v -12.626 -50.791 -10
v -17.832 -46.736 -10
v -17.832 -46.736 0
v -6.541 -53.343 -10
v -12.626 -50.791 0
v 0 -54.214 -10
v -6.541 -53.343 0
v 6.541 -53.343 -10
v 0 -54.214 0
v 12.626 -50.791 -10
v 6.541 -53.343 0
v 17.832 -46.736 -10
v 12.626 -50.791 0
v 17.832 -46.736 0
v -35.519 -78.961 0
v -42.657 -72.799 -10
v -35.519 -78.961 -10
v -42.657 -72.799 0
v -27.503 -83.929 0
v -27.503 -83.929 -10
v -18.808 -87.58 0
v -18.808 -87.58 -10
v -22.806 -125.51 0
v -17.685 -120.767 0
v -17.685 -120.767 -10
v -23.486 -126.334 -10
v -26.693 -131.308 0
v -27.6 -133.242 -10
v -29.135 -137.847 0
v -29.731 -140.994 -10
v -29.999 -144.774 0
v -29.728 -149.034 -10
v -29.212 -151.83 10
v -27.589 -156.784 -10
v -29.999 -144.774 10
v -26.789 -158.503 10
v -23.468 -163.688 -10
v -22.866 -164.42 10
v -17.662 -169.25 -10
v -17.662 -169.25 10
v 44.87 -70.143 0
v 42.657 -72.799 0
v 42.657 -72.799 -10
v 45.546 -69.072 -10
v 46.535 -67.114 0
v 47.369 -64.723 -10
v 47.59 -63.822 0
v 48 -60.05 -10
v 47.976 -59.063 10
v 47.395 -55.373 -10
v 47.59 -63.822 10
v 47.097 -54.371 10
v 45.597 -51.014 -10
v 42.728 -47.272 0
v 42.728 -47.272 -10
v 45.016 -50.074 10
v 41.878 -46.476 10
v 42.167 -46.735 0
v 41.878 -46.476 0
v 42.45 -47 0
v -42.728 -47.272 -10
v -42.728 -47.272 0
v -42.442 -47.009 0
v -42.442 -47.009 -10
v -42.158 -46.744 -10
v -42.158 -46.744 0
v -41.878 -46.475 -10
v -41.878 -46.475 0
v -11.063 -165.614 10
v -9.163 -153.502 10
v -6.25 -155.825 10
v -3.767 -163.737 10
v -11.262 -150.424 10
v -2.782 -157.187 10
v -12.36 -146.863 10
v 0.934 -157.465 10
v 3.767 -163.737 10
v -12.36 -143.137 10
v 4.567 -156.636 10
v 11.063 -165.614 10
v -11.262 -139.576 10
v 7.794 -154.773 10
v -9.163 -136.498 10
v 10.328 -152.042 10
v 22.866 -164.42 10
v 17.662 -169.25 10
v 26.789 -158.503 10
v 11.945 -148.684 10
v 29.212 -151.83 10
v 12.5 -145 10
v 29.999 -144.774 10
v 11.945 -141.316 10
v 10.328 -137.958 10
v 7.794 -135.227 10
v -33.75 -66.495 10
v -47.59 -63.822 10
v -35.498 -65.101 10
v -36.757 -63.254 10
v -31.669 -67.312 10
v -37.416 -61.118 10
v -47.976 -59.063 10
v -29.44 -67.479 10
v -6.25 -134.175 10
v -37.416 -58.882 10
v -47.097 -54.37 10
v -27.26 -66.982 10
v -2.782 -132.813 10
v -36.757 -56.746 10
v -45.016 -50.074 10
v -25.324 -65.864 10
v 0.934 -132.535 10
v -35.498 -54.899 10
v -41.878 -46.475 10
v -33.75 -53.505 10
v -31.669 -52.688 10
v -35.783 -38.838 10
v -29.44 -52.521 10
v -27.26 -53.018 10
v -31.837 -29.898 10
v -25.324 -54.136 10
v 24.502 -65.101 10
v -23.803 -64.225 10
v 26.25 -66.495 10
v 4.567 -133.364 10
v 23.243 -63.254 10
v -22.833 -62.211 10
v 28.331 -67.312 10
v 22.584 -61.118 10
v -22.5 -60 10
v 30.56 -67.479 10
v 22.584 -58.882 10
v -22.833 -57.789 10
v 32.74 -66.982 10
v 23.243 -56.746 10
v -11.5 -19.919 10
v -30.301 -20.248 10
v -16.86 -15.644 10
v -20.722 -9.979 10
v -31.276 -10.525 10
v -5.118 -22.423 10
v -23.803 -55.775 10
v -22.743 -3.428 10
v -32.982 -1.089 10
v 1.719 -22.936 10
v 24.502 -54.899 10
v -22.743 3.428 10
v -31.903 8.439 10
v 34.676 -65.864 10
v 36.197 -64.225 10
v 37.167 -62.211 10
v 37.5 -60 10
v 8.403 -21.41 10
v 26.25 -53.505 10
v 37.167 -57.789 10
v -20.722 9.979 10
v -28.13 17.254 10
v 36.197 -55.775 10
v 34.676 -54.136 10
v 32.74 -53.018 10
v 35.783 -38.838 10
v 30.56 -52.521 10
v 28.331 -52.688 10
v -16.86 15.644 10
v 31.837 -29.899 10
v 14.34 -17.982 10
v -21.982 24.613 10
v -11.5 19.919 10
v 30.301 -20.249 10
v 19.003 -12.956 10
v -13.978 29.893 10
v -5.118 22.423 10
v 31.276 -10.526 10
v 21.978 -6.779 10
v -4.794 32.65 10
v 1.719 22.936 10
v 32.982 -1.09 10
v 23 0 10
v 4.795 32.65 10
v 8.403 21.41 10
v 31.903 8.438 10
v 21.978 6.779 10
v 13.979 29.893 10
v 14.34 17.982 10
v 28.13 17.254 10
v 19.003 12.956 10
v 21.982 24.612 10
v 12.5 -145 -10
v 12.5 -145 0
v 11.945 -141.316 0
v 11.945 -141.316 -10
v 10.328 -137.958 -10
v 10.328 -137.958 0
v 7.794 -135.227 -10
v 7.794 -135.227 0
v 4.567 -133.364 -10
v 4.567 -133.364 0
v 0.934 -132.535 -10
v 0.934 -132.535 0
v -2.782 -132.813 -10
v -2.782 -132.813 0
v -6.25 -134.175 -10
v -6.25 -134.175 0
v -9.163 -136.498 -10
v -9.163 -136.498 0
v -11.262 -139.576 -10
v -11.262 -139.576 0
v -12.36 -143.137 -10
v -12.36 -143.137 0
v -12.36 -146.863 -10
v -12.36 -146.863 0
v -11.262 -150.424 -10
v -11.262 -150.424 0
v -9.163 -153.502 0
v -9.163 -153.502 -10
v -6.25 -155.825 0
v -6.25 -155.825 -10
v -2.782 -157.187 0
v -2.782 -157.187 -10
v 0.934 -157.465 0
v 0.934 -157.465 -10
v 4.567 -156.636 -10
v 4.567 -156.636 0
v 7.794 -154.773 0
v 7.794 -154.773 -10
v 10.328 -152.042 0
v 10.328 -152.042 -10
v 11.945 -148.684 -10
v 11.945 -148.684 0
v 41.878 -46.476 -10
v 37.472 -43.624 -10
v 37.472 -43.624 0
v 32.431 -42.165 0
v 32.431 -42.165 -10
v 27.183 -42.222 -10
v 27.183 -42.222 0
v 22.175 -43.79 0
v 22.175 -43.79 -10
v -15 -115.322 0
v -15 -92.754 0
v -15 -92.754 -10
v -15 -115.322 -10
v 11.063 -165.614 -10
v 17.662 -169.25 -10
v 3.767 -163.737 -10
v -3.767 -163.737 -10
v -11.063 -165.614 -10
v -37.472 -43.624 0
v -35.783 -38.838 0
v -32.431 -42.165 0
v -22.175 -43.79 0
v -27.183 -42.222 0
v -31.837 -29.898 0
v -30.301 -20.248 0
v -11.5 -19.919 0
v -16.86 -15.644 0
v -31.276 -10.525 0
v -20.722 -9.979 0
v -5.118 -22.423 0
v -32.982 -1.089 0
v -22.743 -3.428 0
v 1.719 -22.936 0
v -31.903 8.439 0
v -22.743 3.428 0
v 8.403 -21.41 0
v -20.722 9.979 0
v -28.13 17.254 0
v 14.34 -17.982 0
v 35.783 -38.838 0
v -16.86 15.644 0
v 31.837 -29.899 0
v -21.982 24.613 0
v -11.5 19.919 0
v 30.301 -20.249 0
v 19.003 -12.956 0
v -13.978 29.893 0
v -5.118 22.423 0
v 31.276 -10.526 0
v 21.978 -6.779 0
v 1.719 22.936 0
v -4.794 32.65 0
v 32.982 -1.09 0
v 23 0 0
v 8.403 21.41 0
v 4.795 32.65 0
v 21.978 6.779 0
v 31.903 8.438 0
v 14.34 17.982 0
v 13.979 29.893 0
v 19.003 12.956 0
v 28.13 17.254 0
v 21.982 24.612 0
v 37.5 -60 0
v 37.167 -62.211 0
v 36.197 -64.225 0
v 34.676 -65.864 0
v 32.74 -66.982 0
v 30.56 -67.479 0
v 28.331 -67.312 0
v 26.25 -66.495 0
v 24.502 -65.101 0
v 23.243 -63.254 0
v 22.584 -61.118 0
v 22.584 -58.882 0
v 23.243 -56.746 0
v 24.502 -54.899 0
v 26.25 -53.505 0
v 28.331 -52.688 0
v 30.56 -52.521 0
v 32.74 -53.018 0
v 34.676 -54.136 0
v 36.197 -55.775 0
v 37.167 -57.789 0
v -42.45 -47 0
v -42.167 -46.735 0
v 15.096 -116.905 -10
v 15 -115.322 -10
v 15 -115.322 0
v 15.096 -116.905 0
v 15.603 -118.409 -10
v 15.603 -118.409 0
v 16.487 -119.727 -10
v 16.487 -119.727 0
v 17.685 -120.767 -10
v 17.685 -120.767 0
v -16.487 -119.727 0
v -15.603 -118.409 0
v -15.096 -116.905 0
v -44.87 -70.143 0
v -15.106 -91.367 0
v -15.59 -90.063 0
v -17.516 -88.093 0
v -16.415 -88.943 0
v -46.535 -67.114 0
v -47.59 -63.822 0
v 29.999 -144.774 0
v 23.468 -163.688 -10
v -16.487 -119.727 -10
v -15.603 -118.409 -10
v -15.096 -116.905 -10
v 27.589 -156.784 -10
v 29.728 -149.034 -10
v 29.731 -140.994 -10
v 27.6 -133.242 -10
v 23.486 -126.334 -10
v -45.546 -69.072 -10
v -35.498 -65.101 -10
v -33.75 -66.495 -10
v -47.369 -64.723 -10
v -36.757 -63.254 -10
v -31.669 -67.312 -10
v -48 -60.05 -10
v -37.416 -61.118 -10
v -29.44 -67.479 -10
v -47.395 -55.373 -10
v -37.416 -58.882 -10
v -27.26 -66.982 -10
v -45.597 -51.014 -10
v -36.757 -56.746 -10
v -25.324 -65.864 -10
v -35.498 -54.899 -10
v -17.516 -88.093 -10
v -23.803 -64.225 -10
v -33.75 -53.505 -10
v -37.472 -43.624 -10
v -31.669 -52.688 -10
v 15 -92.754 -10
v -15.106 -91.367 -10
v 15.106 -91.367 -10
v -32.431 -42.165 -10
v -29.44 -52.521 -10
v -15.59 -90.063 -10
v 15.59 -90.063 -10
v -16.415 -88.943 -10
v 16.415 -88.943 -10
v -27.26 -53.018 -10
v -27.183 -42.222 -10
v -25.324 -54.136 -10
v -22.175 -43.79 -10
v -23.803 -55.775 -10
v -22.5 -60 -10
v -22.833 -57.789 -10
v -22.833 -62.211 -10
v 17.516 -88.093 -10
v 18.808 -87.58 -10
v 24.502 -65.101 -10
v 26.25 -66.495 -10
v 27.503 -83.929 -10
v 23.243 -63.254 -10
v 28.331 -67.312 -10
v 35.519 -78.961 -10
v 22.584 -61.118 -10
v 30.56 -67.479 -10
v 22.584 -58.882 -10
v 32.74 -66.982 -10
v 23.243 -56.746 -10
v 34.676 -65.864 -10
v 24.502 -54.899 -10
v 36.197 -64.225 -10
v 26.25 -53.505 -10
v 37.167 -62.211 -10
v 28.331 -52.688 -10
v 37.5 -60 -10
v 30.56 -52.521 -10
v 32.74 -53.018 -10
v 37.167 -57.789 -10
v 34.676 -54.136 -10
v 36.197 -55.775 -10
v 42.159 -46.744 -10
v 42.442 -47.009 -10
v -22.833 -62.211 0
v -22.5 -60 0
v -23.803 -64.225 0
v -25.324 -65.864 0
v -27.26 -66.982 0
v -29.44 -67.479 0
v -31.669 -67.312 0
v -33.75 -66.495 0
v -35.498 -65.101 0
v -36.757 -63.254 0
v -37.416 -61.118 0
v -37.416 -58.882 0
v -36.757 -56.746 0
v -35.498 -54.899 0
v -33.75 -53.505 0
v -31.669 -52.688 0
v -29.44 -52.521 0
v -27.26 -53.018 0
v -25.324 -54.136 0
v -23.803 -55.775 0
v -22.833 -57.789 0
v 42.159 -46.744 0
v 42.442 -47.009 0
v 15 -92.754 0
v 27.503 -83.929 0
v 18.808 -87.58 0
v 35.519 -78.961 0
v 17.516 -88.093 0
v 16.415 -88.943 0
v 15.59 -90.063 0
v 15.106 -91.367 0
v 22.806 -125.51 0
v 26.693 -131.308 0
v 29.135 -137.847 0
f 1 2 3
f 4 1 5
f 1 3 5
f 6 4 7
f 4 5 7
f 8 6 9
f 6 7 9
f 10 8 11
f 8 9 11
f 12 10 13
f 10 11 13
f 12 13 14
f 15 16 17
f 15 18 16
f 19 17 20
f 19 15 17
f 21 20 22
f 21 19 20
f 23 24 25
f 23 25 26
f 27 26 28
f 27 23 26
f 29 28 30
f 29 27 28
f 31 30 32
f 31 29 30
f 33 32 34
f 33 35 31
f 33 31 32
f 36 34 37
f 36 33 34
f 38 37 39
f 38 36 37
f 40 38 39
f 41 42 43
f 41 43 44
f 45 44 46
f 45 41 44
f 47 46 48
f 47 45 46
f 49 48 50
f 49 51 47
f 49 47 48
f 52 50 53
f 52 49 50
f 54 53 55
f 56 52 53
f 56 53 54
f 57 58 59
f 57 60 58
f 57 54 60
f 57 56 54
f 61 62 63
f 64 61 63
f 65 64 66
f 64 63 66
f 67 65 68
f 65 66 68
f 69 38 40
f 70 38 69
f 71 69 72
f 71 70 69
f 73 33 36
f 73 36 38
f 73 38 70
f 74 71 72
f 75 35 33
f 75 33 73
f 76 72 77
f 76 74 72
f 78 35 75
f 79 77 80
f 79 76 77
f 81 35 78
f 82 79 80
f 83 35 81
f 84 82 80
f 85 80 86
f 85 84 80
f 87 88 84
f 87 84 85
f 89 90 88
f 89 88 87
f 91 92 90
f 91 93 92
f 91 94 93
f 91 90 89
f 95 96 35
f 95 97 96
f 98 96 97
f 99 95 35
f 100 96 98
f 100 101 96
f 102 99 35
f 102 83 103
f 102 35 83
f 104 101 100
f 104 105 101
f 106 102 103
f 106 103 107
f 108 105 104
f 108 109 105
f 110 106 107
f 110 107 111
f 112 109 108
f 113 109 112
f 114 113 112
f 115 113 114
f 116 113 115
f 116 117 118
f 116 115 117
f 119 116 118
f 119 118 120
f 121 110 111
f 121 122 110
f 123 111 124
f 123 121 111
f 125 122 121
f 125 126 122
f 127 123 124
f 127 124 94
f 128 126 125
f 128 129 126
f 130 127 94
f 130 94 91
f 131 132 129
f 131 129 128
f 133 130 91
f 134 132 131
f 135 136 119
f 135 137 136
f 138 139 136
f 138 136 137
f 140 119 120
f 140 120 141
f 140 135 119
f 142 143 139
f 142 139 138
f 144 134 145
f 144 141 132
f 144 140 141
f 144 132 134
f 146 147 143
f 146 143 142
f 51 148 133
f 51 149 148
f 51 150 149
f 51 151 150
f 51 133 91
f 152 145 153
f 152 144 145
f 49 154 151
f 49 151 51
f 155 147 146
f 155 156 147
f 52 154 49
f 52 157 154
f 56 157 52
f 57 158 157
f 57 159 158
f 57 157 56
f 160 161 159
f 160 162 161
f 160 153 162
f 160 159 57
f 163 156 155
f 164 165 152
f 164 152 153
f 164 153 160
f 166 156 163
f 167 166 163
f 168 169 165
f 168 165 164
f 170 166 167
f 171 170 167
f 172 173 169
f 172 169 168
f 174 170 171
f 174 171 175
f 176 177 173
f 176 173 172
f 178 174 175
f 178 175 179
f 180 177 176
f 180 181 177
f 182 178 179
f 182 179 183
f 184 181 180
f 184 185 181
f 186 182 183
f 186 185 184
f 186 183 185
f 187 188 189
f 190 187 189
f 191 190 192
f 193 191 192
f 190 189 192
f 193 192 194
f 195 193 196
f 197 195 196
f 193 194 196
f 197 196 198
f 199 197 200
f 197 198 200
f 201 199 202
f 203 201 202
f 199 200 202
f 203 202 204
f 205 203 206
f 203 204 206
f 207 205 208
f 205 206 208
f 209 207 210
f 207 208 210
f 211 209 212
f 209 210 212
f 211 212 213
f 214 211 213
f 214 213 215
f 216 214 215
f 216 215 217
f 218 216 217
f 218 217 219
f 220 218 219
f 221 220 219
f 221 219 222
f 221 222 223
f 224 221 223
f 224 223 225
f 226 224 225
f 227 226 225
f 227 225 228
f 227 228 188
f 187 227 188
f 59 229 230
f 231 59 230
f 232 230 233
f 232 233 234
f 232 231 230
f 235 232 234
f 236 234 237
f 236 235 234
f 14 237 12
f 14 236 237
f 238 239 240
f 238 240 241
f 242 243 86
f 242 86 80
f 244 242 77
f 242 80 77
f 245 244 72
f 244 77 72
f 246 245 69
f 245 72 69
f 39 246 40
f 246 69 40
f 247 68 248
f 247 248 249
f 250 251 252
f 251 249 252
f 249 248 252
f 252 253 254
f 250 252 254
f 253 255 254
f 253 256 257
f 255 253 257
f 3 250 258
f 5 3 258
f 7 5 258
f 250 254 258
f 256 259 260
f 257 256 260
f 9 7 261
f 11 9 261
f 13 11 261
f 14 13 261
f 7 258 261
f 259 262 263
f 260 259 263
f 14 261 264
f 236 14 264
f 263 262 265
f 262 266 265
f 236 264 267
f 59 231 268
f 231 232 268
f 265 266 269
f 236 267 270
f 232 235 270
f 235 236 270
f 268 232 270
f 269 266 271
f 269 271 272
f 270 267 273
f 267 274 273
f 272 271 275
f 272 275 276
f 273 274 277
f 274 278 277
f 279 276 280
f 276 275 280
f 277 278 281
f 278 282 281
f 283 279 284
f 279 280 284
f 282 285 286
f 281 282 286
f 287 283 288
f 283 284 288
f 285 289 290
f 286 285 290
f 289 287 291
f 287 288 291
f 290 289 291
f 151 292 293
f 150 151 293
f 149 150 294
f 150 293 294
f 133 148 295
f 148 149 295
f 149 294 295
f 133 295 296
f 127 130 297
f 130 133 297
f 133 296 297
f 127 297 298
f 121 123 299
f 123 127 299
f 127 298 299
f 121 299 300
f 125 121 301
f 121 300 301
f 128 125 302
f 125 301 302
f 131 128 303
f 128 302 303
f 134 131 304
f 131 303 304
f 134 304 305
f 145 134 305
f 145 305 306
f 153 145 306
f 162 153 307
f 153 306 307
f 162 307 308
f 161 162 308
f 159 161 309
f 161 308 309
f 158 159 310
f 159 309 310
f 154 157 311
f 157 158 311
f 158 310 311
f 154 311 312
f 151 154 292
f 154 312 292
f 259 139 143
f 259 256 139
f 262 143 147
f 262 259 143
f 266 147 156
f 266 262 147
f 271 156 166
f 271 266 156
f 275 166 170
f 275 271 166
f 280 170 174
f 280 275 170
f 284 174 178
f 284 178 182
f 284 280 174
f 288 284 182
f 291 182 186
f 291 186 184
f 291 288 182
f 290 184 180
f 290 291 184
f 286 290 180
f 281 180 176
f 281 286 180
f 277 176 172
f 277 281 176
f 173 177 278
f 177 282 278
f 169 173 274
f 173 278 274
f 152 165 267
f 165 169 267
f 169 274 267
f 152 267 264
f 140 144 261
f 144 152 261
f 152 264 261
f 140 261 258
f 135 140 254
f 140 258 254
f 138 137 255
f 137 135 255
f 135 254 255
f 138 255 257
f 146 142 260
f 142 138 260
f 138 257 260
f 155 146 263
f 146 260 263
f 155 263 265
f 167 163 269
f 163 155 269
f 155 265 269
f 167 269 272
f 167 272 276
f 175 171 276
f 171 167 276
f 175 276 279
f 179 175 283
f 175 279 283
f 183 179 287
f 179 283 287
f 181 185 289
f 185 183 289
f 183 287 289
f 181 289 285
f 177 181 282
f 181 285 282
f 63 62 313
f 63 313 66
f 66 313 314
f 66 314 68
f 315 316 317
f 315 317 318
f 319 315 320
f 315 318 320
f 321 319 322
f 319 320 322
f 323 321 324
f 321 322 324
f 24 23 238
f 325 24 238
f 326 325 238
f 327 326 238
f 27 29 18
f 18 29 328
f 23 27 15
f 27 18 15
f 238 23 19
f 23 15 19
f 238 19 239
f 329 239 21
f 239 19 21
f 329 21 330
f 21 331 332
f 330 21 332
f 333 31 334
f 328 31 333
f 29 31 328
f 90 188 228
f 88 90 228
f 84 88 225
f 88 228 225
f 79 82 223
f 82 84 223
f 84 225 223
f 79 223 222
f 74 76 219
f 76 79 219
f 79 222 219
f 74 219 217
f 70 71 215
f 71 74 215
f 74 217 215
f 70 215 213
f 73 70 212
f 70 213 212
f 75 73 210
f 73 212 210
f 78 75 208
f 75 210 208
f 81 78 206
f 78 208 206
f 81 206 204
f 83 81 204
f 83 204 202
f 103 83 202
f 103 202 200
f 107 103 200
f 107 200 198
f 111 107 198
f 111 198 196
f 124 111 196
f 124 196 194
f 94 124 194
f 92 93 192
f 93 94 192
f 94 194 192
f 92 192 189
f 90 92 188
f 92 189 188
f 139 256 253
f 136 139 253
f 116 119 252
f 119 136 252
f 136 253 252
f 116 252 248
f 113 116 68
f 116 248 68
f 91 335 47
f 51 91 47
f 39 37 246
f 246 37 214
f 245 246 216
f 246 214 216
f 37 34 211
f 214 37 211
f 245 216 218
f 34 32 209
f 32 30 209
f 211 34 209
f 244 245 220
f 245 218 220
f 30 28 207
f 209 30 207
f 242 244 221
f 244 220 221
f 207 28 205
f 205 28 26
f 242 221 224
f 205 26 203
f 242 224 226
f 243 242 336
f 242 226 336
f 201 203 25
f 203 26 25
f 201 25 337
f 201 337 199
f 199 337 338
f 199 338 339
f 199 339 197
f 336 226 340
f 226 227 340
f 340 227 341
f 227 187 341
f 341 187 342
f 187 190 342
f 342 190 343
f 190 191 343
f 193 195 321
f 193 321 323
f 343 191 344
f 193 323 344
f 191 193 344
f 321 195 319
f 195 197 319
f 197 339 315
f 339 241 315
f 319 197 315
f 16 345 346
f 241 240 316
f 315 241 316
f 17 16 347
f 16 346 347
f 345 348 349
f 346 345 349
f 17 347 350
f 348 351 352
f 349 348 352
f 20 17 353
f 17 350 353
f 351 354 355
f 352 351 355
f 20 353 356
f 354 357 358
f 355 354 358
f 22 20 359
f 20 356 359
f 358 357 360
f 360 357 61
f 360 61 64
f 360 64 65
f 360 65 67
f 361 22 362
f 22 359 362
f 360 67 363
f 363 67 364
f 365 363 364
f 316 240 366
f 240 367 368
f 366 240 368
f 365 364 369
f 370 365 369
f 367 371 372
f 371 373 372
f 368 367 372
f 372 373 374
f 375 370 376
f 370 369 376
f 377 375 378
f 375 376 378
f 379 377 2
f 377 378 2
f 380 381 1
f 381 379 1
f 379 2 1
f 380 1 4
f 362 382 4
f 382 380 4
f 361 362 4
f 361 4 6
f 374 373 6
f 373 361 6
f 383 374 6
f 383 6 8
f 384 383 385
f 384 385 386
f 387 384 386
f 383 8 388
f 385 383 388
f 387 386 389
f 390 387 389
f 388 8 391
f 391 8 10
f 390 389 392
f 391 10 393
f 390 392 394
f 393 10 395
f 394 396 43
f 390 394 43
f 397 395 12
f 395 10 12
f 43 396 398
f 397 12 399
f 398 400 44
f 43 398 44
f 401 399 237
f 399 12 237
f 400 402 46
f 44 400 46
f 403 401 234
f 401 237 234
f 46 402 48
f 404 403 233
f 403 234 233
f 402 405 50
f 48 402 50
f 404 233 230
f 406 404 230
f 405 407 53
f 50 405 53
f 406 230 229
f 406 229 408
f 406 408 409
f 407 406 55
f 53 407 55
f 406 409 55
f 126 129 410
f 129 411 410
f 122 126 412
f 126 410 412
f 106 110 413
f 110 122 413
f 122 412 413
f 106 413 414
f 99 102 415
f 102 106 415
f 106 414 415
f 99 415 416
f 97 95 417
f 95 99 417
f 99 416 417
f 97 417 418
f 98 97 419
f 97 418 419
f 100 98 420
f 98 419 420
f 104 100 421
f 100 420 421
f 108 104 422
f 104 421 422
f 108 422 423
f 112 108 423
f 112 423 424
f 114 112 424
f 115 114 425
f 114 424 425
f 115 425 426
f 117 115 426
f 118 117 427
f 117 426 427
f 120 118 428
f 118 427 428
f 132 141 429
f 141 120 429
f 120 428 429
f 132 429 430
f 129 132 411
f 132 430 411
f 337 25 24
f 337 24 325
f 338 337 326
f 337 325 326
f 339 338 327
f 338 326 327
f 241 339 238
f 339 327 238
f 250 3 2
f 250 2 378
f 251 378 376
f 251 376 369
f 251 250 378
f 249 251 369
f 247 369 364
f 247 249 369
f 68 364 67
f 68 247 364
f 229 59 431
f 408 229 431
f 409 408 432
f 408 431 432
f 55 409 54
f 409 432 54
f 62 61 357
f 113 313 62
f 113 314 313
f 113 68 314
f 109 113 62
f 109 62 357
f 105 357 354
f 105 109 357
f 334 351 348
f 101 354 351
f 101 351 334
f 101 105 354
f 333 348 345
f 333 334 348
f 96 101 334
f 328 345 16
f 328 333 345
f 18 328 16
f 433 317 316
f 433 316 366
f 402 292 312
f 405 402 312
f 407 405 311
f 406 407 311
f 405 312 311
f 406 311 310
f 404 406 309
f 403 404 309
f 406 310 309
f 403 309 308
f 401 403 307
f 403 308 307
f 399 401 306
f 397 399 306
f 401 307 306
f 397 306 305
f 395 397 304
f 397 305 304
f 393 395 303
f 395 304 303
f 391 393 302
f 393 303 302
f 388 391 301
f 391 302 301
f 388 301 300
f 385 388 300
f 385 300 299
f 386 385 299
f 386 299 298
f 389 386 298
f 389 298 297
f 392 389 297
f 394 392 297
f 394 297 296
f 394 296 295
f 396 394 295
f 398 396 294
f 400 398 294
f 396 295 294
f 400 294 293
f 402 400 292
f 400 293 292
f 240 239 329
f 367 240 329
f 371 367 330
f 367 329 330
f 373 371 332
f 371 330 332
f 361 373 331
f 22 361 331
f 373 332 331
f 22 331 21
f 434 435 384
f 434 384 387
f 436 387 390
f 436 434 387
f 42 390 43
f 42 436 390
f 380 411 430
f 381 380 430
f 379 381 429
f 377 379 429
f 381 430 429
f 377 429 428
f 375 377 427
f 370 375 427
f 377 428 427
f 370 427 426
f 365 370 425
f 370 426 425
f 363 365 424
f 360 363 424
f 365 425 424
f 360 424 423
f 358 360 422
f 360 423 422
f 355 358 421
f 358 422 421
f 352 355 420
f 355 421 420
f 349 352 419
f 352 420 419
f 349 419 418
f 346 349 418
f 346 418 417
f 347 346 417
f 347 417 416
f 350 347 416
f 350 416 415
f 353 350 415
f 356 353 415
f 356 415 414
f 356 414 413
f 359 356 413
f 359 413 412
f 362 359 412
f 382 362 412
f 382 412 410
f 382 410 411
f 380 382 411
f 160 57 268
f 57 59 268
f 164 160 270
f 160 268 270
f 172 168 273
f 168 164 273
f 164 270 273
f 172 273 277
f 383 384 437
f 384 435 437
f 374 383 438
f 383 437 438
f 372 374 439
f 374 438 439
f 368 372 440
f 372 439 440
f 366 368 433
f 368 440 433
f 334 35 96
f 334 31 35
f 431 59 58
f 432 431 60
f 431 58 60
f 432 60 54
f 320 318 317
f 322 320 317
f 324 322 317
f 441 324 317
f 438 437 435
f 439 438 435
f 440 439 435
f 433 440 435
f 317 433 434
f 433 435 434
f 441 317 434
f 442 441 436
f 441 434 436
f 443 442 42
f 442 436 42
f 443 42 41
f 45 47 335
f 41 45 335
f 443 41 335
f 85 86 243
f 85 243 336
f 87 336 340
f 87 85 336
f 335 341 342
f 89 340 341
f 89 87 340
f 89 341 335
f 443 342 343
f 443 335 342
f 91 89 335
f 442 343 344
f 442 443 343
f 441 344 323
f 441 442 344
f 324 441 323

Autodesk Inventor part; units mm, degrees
ref_plane "YZ Plane" through (0, 0, 0) normal (1, 0, 0) x (0, 1, 0)
ref_plane "XZ Plane" through (0, 0, 0) normal (0, 1, 0) x (-1, 0, 0)
ref_plane "XY Plane" through (0, 0, 0) normal (0, 0, 1) x (1, 0, 0)
sketch "Эскиз1" plane through (0, 0, 0) normal (0, 0, 1) x (1, 0, 0)
  circle A0 centre (0, 0) radius 33
  circle A1 centre (-30, -60) radius 7.5
  circle A2 centre (30, -60) radius 7.5
  arc A3 (42.6567, -72.7987) -> (17.0554, -47.4925) centre (30, -60) ccw
  arc A4 (-17.0554, -47.4925) -> (-42.6567, -72.7987) centre (-30, -60) ccw
  circle A5 centre (0, -145) radius 12.5
  arc A6 (32.1885, -7.2731) -> (42.7278, -47.2719) centre (68.2848, -19.1501) ccw
  arc A7 (-17.8315, -46.7362) -> (17.8315, -46.7362) centre (0, -29.2137) ccw
  arc A8 (-42.7278, -47.2719) -> (-32.1885, -7.2731) centre (-68.2848, -19.1501) ccw
  line L0 (-15, -102.5) -> (-15, -116.1893)
  line L1 (15, -102.5) -> (15, -116.1893)
  line L2 (-15, -102.5) -> (-15, -92.1226)
  line L3 (15, -102.5) -> (15, -92.1226)
  arc A9 (-15, -92.7535) -> (-18.8083, -87.5797) centre (-19.99, -92.4381) ccw
  arc A10 (-43.0534, -72.3939) -> (-18.1041, -87.8074) centre (0, -30.6039) ccw
  arc A11 (18.1041, -87.8074) -> (43.0534, -72.3939) centre (0, -30.6039) ccw
  arc A12 (-17.6847, -120.7667) -> (-15, -115.3217) centre (-20.9843, -115.7555) ccw
  arc A13 (18.8083, -87.5797) -> (15, -92.7535) centre (19.99, -92.4381) ccw
  arc A14 (15, -115.3217) -> (17.6847, -120.7667) centre (20.9843, -115.7555) ccw
  arc A15 (17.6618, -169.25) -> (-17.6618, -169.25) centre (0, -193.5) ccw
  arc A16 (-17.2936, -120.4861) -> (-17.6618, -169.25) centre (0, -145) ccw
  arc A17 (17.6618, -169.25) -> (17.2936, -120.4861) centre (0, -145) ccw
  line L4 (29.9991, -144.7735) -> (47.5895, -63.8221)
  line L5 (-29.9991, -144.7735) -> (-47.5895, -63.8221)
  circle A18 centre (0, 0) radius 23
  point P0 (41.8771, -46.4746)
  point P1 (31.2765, -10.5253)
  point P2 (-31.2765, -10.5253)
  point P3 (-41.8771, -46.4746)
  point P4 (15, -92.7535)
  dimension "d1" = 66
  dimension "d5" = 15
  dimension "d6" = 15
  dimension "d7" = 36
  dimension "d8" = 36
  dimension "d10" = 25
  dimension "d13" = 76
  dimension "d17" = 30
  dimension "d18" = 10
  dimension "d19" = 12
  dimension "d22" = 60
  dimension "d30" = 46
sketch "Эскиз2" plane through (0, 0, 0) normal (0, 0, 1) x (1, 0, 0)
  point P0 (0, 0)
extrude "Выдавливание1" add sketch "Эскиз1" along normal blind 10 contours A0 A6 A8 | A8 A0 | A0 A6 | A0 A6 A3 A7 A4 A8 | A8 A4 | A4 A7 A3 A6 A11 A13 L3 L1 A14 A17 A15 A16 A12 L0 L2 A9 A10 A8 | A3 A6 | A4 A7 | A7 A3 | A4 A10 A9 L2 L0 A12 A16 L5 | L4 A17 A14 L1 L3 A13 A11 A3 | A16 A12 | A14 A17 | A9 A10 | A11 A13 | L0 A12 | A14 L1 | A9 L2 | L3 A13 | A1 | A2 | A5 | A18
extrude "Выдавливание2" add sketch "Эскиз1" against normal blind 10 contours A4 A7 A3 A6 A11 A13 L3 L1 A14 A17 A15 A16 A12 L0 L2 A9 A10 A8
extrude "Выдавливание3" cut sketch "Эскиз1" along normal blind 10 contours A5
extrude "Выдавливание4" cut sketch "Эскиз1" along normal blind 10 contours A2
extrude "Выдавливание5" cut sketch "Эскиз1" along normal blind 10 contours A1
extrude "Выдавливание6" cut sketch "Эскиз1" along normal blind 10 contours A18
properties material "Сталь, гальванизированная"
